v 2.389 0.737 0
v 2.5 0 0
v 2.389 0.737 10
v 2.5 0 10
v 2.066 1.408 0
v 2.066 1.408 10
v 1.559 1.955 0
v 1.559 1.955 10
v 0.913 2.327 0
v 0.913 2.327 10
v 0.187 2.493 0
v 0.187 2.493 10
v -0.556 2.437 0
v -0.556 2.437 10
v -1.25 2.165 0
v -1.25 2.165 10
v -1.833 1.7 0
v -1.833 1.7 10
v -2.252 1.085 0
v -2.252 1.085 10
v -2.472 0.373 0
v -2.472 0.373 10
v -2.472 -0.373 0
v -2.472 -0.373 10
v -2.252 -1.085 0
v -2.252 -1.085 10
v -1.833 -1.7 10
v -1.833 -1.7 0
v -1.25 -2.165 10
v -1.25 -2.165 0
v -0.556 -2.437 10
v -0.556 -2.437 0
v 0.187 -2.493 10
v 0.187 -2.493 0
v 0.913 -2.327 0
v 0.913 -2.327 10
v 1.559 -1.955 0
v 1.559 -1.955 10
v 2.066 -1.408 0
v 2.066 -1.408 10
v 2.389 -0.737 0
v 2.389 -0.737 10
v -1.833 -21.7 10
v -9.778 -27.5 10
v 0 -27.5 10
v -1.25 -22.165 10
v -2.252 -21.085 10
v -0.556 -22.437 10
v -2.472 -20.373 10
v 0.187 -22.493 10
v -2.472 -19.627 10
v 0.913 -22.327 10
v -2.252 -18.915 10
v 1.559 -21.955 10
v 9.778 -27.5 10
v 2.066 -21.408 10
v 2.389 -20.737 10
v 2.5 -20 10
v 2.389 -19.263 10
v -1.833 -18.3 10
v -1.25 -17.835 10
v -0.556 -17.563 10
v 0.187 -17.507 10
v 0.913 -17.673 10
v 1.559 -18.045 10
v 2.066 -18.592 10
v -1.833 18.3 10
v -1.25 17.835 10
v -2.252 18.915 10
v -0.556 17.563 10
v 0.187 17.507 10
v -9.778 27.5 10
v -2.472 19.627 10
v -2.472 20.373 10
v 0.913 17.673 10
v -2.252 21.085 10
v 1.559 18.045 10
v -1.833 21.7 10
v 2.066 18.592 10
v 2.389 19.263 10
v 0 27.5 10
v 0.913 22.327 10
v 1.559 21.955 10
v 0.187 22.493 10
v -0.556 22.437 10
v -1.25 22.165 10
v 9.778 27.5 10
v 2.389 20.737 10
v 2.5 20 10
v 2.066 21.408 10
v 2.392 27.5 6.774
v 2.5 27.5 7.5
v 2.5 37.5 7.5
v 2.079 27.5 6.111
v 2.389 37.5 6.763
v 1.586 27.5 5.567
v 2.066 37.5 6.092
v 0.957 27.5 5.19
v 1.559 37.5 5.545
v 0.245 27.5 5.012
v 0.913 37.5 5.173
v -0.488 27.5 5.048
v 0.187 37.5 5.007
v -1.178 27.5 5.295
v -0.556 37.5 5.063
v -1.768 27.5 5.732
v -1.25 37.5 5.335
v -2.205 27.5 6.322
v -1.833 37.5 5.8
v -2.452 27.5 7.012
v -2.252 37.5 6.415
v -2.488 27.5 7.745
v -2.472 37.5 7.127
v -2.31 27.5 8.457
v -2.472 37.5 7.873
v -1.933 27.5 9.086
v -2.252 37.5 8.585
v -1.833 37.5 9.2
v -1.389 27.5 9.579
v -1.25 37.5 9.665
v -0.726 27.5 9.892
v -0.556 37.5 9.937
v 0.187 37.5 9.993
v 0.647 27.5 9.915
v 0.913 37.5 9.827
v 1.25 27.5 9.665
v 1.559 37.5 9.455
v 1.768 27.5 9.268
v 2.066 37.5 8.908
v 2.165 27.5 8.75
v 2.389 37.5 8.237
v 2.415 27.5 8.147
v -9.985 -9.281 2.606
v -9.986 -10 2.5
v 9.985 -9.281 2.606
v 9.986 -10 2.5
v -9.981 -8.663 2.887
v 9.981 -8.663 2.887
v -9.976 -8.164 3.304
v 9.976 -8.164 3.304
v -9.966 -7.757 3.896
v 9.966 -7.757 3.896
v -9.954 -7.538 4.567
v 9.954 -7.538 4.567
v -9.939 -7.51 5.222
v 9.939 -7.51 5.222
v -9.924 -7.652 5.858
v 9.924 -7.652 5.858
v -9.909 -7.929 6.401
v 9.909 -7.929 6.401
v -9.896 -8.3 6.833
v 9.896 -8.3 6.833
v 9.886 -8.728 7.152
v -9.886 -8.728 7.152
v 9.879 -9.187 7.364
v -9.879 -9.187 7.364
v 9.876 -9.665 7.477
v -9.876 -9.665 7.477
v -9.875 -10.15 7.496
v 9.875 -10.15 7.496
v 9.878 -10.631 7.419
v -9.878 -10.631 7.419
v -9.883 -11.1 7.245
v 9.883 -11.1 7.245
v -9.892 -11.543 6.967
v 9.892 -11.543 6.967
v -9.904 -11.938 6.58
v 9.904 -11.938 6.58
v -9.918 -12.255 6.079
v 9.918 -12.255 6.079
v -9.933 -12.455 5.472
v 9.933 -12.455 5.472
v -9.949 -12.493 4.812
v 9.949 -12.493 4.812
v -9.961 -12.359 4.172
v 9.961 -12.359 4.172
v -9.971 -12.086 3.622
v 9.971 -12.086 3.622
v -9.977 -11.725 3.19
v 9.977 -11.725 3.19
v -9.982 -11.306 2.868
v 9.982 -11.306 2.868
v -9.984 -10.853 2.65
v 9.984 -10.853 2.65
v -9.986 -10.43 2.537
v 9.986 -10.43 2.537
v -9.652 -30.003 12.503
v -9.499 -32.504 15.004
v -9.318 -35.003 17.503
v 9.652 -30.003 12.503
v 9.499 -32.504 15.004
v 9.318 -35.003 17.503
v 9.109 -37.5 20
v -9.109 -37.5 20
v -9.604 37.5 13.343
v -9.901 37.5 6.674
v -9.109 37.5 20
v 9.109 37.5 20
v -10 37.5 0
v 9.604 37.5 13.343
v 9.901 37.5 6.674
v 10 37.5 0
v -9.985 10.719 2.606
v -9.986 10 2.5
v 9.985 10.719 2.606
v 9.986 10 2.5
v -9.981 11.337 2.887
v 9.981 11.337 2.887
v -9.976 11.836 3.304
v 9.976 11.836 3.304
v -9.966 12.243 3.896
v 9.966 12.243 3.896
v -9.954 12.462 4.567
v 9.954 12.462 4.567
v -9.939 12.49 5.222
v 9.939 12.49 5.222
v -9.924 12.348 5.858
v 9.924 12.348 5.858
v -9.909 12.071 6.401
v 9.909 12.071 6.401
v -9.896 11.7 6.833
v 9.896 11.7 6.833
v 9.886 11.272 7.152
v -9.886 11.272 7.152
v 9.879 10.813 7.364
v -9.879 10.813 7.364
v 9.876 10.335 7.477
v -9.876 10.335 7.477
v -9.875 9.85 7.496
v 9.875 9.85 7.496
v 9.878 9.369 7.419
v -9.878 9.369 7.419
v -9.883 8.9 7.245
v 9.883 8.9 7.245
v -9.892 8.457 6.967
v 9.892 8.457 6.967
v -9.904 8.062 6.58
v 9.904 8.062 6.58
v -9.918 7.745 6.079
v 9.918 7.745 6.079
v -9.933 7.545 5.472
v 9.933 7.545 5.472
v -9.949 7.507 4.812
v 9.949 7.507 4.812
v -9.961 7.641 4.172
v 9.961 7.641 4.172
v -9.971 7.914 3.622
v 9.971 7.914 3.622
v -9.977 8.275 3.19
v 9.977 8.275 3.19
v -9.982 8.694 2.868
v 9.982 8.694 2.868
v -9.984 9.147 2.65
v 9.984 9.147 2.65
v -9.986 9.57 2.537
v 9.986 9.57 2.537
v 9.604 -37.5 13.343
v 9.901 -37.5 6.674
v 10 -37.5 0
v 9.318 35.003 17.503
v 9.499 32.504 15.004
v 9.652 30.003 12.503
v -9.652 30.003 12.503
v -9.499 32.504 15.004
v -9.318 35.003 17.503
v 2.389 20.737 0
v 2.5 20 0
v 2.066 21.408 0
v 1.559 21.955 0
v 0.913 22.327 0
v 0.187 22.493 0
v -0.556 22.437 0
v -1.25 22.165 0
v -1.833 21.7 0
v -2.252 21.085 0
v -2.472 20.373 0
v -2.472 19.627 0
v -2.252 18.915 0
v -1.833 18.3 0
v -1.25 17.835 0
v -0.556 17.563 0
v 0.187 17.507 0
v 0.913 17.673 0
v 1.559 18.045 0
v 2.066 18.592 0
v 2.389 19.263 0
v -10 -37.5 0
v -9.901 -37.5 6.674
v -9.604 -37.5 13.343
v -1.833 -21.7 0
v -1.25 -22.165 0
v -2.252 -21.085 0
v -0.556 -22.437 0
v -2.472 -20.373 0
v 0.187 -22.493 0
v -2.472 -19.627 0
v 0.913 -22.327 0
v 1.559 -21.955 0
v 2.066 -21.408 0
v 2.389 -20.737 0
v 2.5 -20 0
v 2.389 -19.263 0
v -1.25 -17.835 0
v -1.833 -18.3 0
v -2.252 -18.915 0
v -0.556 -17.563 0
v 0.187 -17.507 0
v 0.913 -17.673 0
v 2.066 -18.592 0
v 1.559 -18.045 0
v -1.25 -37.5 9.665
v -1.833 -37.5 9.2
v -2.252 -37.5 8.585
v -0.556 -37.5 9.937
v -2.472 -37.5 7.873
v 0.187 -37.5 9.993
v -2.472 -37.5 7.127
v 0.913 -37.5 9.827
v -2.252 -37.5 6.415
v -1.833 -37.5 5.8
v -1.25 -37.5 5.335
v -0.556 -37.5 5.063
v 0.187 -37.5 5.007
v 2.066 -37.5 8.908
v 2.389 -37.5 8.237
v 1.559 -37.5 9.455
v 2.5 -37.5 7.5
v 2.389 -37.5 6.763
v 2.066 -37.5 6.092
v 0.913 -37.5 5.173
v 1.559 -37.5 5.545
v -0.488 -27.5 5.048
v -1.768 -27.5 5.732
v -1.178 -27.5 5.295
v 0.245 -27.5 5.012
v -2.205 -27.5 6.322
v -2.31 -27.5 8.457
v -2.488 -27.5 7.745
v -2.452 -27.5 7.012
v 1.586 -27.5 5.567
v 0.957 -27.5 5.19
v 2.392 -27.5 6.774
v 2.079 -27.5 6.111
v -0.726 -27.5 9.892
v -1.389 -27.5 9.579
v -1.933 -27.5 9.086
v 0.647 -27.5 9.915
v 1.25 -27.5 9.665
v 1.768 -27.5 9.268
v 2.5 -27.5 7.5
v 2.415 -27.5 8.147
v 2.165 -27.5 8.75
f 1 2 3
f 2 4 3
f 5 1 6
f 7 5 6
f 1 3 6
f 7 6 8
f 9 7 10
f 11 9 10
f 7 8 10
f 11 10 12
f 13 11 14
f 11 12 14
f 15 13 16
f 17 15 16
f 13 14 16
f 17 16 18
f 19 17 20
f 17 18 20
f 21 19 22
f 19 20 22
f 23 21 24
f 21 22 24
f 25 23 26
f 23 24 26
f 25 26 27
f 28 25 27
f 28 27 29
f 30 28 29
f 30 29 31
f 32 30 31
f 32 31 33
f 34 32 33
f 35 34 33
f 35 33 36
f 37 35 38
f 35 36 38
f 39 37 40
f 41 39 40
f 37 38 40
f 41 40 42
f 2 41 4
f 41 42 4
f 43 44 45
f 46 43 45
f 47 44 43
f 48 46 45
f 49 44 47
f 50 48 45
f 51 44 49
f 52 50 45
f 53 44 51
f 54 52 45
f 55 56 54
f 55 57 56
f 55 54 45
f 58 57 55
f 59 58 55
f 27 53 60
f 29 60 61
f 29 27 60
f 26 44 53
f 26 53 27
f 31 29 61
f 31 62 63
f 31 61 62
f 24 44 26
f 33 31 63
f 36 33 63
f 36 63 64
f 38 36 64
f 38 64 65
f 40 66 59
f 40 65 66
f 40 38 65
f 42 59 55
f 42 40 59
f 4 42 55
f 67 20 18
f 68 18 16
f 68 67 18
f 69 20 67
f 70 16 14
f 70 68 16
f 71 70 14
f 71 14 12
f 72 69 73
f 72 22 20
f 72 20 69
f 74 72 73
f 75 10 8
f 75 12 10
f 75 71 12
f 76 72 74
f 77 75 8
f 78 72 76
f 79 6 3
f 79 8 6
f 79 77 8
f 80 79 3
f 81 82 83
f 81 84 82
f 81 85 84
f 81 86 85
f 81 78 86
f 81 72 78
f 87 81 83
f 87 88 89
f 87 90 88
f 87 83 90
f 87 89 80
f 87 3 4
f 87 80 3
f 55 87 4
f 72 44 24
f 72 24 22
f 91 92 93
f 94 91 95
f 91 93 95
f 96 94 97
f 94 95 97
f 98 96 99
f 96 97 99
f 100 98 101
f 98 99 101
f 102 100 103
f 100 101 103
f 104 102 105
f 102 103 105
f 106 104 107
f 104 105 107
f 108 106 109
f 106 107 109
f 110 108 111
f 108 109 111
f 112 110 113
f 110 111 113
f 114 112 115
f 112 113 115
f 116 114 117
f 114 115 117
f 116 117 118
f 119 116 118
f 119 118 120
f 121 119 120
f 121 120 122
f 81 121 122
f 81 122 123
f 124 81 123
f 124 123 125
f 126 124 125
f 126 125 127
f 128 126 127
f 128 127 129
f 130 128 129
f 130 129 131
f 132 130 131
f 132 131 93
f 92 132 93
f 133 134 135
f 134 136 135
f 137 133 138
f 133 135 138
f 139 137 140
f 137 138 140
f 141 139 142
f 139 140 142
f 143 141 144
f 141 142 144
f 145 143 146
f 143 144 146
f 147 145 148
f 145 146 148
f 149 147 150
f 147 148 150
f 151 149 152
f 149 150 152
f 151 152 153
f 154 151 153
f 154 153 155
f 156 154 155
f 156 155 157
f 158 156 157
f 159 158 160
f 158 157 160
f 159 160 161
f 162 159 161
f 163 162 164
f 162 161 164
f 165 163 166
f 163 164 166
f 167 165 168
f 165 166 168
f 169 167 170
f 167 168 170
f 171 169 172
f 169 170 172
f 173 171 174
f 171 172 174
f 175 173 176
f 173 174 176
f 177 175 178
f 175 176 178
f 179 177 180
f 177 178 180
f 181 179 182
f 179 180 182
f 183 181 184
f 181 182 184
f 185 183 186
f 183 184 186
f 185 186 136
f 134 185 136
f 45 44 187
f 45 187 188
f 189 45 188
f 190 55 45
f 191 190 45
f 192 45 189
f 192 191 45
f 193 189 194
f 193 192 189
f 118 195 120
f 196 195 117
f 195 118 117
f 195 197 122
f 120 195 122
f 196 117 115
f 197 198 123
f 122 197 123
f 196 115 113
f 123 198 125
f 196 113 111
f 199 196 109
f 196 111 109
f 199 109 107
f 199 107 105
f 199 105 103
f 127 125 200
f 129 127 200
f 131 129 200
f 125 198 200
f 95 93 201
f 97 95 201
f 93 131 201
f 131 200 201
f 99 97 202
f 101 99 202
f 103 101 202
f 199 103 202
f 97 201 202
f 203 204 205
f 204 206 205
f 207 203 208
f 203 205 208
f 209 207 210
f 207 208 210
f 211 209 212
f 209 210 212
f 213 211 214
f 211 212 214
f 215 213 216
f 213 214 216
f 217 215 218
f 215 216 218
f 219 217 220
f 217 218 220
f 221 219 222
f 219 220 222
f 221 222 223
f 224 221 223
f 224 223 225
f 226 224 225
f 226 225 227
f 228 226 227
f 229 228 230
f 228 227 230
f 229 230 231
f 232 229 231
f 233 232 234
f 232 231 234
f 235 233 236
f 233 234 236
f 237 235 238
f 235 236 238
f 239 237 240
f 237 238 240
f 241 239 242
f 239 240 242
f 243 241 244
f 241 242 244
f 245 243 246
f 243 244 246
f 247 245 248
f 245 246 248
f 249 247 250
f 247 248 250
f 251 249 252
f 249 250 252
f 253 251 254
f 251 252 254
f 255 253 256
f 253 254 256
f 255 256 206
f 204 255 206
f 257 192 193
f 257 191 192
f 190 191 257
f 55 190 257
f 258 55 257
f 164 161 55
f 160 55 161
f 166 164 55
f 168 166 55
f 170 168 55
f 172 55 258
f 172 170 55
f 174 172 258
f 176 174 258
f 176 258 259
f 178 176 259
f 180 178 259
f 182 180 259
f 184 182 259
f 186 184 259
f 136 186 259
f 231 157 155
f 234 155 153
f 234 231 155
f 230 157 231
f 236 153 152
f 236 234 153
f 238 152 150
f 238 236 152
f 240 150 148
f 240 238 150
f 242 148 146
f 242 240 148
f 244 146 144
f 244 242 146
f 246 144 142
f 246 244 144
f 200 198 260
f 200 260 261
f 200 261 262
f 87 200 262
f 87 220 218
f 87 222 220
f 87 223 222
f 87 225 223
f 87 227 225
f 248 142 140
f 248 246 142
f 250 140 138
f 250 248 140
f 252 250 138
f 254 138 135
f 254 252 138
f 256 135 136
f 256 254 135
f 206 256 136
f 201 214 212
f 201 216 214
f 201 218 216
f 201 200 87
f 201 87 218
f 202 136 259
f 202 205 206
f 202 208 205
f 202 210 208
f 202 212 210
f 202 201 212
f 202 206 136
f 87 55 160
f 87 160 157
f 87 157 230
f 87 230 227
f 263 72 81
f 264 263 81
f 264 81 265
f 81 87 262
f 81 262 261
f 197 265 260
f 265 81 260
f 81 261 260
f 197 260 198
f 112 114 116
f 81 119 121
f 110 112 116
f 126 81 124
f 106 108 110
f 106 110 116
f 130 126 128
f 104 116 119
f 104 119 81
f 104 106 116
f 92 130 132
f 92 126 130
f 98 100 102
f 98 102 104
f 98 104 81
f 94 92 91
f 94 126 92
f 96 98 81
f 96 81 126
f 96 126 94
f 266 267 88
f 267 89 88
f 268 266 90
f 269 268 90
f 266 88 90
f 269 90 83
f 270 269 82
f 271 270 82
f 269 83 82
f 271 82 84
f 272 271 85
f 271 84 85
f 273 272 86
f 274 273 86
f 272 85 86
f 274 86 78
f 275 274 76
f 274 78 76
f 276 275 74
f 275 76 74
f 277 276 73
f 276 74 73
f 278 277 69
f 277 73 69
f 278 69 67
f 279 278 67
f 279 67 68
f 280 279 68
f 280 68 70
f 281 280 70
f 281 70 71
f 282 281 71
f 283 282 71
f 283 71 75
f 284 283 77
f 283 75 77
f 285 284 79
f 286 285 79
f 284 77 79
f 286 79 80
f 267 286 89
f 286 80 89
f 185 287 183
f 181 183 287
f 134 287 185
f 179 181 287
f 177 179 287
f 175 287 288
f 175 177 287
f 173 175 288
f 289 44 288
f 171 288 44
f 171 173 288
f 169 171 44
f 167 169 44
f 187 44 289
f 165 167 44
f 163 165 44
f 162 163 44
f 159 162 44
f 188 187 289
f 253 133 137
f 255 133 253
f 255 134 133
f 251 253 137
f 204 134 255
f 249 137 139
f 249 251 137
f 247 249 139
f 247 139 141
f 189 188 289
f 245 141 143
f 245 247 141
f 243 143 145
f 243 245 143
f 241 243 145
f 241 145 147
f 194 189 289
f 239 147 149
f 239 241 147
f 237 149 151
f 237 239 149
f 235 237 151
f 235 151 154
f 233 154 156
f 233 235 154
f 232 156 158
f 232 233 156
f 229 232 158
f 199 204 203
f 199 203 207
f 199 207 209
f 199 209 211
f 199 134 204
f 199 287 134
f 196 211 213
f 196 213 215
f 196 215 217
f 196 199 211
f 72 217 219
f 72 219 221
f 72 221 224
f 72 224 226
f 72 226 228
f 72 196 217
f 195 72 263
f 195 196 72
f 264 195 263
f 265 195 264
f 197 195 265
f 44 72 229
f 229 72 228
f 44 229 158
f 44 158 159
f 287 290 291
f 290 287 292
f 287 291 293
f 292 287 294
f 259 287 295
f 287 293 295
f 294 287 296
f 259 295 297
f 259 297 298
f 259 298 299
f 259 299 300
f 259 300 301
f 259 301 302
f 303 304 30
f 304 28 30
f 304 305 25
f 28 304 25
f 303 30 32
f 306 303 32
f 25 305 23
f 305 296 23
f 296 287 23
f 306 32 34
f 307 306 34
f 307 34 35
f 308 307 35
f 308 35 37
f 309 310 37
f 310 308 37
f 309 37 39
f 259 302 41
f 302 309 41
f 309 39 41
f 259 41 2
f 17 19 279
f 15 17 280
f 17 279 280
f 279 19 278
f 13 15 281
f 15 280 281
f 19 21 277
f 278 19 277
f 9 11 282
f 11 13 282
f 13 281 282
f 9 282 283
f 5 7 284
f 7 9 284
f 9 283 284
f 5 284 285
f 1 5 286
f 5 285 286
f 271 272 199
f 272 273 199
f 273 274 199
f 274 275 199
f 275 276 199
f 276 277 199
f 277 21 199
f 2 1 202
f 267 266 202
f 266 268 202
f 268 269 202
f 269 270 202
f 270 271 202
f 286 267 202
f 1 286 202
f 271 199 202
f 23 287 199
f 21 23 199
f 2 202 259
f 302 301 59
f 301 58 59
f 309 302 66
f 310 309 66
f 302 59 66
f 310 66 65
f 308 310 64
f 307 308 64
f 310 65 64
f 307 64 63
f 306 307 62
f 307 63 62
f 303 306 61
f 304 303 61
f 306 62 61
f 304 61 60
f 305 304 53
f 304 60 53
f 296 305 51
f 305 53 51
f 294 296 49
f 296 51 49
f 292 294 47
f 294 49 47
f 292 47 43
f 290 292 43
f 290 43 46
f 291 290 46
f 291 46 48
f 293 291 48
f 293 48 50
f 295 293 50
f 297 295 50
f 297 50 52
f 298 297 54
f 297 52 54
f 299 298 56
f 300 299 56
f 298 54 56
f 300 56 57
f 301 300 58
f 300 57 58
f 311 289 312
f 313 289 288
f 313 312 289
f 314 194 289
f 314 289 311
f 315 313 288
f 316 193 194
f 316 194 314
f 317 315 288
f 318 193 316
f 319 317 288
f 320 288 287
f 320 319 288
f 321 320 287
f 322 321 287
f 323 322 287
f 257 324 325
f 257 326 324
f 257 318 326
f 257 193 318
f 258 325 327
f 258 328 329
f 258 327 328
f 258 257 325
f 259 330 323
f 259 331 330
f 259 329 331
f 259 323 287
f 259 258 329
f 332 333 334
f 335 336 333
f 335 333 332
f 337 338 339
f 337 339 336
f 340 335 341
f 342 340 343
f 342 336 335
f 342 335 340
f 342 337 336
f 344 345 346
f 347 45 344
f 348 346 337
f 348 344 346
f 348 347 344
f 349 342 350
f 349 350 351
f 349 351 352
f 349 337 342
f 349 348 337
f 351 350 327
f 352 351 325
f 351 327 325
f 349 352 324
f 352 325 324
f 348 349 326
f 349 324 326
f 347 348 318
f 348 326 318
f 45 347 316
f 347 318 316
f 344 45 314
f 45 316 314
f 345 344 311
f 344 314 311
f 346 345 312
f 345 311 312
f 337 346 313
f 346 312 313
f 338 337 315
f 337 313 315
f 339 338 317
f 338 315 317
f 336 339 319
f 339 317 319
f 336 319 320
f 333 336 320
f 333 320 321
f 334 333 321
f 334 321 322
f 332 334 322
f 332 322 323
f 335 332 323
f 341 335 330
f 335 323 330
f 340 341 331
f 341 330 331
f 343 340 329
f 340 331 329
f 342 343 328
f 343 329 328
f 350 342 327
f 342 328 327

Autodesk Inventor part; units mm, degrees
ref_plane "YZ Plane" through (0, 0, 0) normal (1, 0, 0) x (0, 1, 0)
ref_plane "XZ Plane" through (0, 0, 0) normal (0, 1, 0) x (-1, 0, 0)
ref_plane "XY Plane" through (0, 0, 0) normal (0, 0, 1) x (1, 0, 0)
sketch "Sketch1" plane through (0, 0, 0) normal (0, 0, 1) x (1, 0, 0)
  line L0 (-10, -27.5) -> (10, -27.5)
  line L1 (10, -27.5) -> (10, 27.5)
  line L2 (10, 27.5) -> (-10, 27.5)
  line L3 (-10, 27.5) -> (-10, -27.5)
  line L4 (-10, -27.5) -> (10, 27.5) construction
  line L5 (10, -27.5) -> (-10, 27.5) construction
  point P0 (0, 0)
  dimension "d0" = 20
  dimension "d1" = 55
extrude "Extrusion1" add sketch "Sketch1" along normal blind 10
sketch "Sketch3" plane through (10, -27.5, 0) normal (1, 0, 0) x (0, 0, -1)
  line L0 (0, 0) -> (0, 55) construction
  line L1 (-10, 0) -> (-10, 55) projected
  line L2 (-10, 55) -> (-20, 65)
  line L3 (0, 55) -> (-10, 55)
  line L4 (-20, 65) -> (0, 65)
  line L5 (0, 65) -> (0, 55)
  line L6 (0, 27.5) -> (-50, 27.5) construction
  line L7 (-10, 0) -> (-20, -10)
  line L8 (0, 0) -> (-10, 0)
  line L9 (-20, -10) -> (0, -10)
  line L10 (0, -10) -> (0, 0)
  dimension "d8" = 20
  dimension "d12" = 10
  dimension "d13" = 50
extrude "Extrusion3" add sketch "Sketch3" against normal blind 20
sketch "Sketch4" plane through (0, 0, 10) normal (0, 0, 1) x (1, 0, 0)
  circle A0 centre (0, 20) radius 2.5
  circle A1 centre (0, 0) radius 2.5
  circle A2 centre (0, -20) radius 2.5
  dimension "d14" = 5
  dimension "d15" = 5
  dimension "d16" = 5
  dimension "d17" = 20
  dimension "d18" = 20
sketch "Sketch5" plane through (10, -37.5, 0) normal (0, -1, 0) x (1, 0, 0)
  circle A0 centre (-10, 7.5) radius 2.5
  circle A1 centre (-10, 7.5) radius 2.5
  point P0 (-10, 0)
  dimension "d19" = 5
  dimension "d20" = 7.5
  dimension "d35" = 5
extrude "Extrusion4" cut sketch "Sketch5" against normal blind 10
extrude "Extrusion5" cut sketch "Sketch4" against normal through all
thread "Thread1" size "M5x0.8" class "6H" standard "ANSI Metric M Profile" full length
thread "Thread2" size "M5x0.8" class "6H" standard "ANSI Metric M Profile" full length
thread "Thread3" size "M5x0.8" class "6H" standard "ANSI Metric M Profile" full length
thread "Thread4" size "M5x0.8" class "6H" standard "ANSI Metric M Profile" full length
thread "Thread5" size "M5x0.8" class "6H" standard "ANSI Metric M Profile" full length
sketch "Sketch6" plane through (10, 37.5, 20) normal (0, 1, 0) x (1, 0, 0)
  circle A0 centre (-10, 12.5) radius 2.5
  line L0 (0, 20) -> (0, 0) projected
  point P0 (-10, 20)
  dimension "d36" = 5
  dimension "d37" = 7.5
  dimension "d38" = 10
extrude "Extrusion6" cut sketch "Sketch6" against normal blind 10
thread "Thread6" size "M5x0.8" class "6H" standard "ANSI Metric M Profile" full length
sketch "Sketch7" plane through (10, 37.5, 20) normal (1, 0, 0) x (0, 0, -1)
  circle A0 centre (15, -27.5) radius 2.5
  circle A1 centre (15, -47.5) radius 2.5
  line L0 (20, -35) -> (20, -40) projected
  line L1 (10, -40) -> (10, -35) projected
  line L2 (20, -75) -> (20, 0) projected
  point P0 (20, -37.5)
  dimension "d43" = 5
  dimension "d44" = 5
  dimension "d45" = 20
  dimension "d46" = 7.5
  dimension "d47" = 5
  dimension "d48" = 5
extrude "Extrusion7" cut sketch "Sketch7" against normal through all
thread "Thread7" size "M5x0.8" class "6H" standard "ANSI Metric M Profile" full length
thread "Thread8" size "M5x0.8" class "6H" standard "ANSI Metric M Profile" full length
sketch "Sketch8" plane through (10, 37.5, 20) normal (0, 1, 0) x (1, 0, 0)
  circle A0 centre (-225, 20) radius 225
  line L0 (0, 20) -> (-20, 20) projected
  circle A1 centre (-225, 20) radius 230
  point P0 (-10, 20)
  point P1 (-10, 20)
  dimension "d55" = 450
  dimension "d56" = 5
extrude "Extrusion8" cut sketch "Sketch8" against normal through all
sketch "Sketch9" plane through (-10, 37.5, 20) normal (0, 1, 0) x (1, 0, 0)
  circle A0 centre (225, 20) radius 225
  circle A1 centre (225, 20) radius 230
  point P0 (10, 20)
  point P1 (0, 20)
  dimension "d59" = 450
  dimension "d60" = 5
extrude "Extrusion9" cut sketch "Sketch9" against normal through all
properties material "ABS Plastic"
